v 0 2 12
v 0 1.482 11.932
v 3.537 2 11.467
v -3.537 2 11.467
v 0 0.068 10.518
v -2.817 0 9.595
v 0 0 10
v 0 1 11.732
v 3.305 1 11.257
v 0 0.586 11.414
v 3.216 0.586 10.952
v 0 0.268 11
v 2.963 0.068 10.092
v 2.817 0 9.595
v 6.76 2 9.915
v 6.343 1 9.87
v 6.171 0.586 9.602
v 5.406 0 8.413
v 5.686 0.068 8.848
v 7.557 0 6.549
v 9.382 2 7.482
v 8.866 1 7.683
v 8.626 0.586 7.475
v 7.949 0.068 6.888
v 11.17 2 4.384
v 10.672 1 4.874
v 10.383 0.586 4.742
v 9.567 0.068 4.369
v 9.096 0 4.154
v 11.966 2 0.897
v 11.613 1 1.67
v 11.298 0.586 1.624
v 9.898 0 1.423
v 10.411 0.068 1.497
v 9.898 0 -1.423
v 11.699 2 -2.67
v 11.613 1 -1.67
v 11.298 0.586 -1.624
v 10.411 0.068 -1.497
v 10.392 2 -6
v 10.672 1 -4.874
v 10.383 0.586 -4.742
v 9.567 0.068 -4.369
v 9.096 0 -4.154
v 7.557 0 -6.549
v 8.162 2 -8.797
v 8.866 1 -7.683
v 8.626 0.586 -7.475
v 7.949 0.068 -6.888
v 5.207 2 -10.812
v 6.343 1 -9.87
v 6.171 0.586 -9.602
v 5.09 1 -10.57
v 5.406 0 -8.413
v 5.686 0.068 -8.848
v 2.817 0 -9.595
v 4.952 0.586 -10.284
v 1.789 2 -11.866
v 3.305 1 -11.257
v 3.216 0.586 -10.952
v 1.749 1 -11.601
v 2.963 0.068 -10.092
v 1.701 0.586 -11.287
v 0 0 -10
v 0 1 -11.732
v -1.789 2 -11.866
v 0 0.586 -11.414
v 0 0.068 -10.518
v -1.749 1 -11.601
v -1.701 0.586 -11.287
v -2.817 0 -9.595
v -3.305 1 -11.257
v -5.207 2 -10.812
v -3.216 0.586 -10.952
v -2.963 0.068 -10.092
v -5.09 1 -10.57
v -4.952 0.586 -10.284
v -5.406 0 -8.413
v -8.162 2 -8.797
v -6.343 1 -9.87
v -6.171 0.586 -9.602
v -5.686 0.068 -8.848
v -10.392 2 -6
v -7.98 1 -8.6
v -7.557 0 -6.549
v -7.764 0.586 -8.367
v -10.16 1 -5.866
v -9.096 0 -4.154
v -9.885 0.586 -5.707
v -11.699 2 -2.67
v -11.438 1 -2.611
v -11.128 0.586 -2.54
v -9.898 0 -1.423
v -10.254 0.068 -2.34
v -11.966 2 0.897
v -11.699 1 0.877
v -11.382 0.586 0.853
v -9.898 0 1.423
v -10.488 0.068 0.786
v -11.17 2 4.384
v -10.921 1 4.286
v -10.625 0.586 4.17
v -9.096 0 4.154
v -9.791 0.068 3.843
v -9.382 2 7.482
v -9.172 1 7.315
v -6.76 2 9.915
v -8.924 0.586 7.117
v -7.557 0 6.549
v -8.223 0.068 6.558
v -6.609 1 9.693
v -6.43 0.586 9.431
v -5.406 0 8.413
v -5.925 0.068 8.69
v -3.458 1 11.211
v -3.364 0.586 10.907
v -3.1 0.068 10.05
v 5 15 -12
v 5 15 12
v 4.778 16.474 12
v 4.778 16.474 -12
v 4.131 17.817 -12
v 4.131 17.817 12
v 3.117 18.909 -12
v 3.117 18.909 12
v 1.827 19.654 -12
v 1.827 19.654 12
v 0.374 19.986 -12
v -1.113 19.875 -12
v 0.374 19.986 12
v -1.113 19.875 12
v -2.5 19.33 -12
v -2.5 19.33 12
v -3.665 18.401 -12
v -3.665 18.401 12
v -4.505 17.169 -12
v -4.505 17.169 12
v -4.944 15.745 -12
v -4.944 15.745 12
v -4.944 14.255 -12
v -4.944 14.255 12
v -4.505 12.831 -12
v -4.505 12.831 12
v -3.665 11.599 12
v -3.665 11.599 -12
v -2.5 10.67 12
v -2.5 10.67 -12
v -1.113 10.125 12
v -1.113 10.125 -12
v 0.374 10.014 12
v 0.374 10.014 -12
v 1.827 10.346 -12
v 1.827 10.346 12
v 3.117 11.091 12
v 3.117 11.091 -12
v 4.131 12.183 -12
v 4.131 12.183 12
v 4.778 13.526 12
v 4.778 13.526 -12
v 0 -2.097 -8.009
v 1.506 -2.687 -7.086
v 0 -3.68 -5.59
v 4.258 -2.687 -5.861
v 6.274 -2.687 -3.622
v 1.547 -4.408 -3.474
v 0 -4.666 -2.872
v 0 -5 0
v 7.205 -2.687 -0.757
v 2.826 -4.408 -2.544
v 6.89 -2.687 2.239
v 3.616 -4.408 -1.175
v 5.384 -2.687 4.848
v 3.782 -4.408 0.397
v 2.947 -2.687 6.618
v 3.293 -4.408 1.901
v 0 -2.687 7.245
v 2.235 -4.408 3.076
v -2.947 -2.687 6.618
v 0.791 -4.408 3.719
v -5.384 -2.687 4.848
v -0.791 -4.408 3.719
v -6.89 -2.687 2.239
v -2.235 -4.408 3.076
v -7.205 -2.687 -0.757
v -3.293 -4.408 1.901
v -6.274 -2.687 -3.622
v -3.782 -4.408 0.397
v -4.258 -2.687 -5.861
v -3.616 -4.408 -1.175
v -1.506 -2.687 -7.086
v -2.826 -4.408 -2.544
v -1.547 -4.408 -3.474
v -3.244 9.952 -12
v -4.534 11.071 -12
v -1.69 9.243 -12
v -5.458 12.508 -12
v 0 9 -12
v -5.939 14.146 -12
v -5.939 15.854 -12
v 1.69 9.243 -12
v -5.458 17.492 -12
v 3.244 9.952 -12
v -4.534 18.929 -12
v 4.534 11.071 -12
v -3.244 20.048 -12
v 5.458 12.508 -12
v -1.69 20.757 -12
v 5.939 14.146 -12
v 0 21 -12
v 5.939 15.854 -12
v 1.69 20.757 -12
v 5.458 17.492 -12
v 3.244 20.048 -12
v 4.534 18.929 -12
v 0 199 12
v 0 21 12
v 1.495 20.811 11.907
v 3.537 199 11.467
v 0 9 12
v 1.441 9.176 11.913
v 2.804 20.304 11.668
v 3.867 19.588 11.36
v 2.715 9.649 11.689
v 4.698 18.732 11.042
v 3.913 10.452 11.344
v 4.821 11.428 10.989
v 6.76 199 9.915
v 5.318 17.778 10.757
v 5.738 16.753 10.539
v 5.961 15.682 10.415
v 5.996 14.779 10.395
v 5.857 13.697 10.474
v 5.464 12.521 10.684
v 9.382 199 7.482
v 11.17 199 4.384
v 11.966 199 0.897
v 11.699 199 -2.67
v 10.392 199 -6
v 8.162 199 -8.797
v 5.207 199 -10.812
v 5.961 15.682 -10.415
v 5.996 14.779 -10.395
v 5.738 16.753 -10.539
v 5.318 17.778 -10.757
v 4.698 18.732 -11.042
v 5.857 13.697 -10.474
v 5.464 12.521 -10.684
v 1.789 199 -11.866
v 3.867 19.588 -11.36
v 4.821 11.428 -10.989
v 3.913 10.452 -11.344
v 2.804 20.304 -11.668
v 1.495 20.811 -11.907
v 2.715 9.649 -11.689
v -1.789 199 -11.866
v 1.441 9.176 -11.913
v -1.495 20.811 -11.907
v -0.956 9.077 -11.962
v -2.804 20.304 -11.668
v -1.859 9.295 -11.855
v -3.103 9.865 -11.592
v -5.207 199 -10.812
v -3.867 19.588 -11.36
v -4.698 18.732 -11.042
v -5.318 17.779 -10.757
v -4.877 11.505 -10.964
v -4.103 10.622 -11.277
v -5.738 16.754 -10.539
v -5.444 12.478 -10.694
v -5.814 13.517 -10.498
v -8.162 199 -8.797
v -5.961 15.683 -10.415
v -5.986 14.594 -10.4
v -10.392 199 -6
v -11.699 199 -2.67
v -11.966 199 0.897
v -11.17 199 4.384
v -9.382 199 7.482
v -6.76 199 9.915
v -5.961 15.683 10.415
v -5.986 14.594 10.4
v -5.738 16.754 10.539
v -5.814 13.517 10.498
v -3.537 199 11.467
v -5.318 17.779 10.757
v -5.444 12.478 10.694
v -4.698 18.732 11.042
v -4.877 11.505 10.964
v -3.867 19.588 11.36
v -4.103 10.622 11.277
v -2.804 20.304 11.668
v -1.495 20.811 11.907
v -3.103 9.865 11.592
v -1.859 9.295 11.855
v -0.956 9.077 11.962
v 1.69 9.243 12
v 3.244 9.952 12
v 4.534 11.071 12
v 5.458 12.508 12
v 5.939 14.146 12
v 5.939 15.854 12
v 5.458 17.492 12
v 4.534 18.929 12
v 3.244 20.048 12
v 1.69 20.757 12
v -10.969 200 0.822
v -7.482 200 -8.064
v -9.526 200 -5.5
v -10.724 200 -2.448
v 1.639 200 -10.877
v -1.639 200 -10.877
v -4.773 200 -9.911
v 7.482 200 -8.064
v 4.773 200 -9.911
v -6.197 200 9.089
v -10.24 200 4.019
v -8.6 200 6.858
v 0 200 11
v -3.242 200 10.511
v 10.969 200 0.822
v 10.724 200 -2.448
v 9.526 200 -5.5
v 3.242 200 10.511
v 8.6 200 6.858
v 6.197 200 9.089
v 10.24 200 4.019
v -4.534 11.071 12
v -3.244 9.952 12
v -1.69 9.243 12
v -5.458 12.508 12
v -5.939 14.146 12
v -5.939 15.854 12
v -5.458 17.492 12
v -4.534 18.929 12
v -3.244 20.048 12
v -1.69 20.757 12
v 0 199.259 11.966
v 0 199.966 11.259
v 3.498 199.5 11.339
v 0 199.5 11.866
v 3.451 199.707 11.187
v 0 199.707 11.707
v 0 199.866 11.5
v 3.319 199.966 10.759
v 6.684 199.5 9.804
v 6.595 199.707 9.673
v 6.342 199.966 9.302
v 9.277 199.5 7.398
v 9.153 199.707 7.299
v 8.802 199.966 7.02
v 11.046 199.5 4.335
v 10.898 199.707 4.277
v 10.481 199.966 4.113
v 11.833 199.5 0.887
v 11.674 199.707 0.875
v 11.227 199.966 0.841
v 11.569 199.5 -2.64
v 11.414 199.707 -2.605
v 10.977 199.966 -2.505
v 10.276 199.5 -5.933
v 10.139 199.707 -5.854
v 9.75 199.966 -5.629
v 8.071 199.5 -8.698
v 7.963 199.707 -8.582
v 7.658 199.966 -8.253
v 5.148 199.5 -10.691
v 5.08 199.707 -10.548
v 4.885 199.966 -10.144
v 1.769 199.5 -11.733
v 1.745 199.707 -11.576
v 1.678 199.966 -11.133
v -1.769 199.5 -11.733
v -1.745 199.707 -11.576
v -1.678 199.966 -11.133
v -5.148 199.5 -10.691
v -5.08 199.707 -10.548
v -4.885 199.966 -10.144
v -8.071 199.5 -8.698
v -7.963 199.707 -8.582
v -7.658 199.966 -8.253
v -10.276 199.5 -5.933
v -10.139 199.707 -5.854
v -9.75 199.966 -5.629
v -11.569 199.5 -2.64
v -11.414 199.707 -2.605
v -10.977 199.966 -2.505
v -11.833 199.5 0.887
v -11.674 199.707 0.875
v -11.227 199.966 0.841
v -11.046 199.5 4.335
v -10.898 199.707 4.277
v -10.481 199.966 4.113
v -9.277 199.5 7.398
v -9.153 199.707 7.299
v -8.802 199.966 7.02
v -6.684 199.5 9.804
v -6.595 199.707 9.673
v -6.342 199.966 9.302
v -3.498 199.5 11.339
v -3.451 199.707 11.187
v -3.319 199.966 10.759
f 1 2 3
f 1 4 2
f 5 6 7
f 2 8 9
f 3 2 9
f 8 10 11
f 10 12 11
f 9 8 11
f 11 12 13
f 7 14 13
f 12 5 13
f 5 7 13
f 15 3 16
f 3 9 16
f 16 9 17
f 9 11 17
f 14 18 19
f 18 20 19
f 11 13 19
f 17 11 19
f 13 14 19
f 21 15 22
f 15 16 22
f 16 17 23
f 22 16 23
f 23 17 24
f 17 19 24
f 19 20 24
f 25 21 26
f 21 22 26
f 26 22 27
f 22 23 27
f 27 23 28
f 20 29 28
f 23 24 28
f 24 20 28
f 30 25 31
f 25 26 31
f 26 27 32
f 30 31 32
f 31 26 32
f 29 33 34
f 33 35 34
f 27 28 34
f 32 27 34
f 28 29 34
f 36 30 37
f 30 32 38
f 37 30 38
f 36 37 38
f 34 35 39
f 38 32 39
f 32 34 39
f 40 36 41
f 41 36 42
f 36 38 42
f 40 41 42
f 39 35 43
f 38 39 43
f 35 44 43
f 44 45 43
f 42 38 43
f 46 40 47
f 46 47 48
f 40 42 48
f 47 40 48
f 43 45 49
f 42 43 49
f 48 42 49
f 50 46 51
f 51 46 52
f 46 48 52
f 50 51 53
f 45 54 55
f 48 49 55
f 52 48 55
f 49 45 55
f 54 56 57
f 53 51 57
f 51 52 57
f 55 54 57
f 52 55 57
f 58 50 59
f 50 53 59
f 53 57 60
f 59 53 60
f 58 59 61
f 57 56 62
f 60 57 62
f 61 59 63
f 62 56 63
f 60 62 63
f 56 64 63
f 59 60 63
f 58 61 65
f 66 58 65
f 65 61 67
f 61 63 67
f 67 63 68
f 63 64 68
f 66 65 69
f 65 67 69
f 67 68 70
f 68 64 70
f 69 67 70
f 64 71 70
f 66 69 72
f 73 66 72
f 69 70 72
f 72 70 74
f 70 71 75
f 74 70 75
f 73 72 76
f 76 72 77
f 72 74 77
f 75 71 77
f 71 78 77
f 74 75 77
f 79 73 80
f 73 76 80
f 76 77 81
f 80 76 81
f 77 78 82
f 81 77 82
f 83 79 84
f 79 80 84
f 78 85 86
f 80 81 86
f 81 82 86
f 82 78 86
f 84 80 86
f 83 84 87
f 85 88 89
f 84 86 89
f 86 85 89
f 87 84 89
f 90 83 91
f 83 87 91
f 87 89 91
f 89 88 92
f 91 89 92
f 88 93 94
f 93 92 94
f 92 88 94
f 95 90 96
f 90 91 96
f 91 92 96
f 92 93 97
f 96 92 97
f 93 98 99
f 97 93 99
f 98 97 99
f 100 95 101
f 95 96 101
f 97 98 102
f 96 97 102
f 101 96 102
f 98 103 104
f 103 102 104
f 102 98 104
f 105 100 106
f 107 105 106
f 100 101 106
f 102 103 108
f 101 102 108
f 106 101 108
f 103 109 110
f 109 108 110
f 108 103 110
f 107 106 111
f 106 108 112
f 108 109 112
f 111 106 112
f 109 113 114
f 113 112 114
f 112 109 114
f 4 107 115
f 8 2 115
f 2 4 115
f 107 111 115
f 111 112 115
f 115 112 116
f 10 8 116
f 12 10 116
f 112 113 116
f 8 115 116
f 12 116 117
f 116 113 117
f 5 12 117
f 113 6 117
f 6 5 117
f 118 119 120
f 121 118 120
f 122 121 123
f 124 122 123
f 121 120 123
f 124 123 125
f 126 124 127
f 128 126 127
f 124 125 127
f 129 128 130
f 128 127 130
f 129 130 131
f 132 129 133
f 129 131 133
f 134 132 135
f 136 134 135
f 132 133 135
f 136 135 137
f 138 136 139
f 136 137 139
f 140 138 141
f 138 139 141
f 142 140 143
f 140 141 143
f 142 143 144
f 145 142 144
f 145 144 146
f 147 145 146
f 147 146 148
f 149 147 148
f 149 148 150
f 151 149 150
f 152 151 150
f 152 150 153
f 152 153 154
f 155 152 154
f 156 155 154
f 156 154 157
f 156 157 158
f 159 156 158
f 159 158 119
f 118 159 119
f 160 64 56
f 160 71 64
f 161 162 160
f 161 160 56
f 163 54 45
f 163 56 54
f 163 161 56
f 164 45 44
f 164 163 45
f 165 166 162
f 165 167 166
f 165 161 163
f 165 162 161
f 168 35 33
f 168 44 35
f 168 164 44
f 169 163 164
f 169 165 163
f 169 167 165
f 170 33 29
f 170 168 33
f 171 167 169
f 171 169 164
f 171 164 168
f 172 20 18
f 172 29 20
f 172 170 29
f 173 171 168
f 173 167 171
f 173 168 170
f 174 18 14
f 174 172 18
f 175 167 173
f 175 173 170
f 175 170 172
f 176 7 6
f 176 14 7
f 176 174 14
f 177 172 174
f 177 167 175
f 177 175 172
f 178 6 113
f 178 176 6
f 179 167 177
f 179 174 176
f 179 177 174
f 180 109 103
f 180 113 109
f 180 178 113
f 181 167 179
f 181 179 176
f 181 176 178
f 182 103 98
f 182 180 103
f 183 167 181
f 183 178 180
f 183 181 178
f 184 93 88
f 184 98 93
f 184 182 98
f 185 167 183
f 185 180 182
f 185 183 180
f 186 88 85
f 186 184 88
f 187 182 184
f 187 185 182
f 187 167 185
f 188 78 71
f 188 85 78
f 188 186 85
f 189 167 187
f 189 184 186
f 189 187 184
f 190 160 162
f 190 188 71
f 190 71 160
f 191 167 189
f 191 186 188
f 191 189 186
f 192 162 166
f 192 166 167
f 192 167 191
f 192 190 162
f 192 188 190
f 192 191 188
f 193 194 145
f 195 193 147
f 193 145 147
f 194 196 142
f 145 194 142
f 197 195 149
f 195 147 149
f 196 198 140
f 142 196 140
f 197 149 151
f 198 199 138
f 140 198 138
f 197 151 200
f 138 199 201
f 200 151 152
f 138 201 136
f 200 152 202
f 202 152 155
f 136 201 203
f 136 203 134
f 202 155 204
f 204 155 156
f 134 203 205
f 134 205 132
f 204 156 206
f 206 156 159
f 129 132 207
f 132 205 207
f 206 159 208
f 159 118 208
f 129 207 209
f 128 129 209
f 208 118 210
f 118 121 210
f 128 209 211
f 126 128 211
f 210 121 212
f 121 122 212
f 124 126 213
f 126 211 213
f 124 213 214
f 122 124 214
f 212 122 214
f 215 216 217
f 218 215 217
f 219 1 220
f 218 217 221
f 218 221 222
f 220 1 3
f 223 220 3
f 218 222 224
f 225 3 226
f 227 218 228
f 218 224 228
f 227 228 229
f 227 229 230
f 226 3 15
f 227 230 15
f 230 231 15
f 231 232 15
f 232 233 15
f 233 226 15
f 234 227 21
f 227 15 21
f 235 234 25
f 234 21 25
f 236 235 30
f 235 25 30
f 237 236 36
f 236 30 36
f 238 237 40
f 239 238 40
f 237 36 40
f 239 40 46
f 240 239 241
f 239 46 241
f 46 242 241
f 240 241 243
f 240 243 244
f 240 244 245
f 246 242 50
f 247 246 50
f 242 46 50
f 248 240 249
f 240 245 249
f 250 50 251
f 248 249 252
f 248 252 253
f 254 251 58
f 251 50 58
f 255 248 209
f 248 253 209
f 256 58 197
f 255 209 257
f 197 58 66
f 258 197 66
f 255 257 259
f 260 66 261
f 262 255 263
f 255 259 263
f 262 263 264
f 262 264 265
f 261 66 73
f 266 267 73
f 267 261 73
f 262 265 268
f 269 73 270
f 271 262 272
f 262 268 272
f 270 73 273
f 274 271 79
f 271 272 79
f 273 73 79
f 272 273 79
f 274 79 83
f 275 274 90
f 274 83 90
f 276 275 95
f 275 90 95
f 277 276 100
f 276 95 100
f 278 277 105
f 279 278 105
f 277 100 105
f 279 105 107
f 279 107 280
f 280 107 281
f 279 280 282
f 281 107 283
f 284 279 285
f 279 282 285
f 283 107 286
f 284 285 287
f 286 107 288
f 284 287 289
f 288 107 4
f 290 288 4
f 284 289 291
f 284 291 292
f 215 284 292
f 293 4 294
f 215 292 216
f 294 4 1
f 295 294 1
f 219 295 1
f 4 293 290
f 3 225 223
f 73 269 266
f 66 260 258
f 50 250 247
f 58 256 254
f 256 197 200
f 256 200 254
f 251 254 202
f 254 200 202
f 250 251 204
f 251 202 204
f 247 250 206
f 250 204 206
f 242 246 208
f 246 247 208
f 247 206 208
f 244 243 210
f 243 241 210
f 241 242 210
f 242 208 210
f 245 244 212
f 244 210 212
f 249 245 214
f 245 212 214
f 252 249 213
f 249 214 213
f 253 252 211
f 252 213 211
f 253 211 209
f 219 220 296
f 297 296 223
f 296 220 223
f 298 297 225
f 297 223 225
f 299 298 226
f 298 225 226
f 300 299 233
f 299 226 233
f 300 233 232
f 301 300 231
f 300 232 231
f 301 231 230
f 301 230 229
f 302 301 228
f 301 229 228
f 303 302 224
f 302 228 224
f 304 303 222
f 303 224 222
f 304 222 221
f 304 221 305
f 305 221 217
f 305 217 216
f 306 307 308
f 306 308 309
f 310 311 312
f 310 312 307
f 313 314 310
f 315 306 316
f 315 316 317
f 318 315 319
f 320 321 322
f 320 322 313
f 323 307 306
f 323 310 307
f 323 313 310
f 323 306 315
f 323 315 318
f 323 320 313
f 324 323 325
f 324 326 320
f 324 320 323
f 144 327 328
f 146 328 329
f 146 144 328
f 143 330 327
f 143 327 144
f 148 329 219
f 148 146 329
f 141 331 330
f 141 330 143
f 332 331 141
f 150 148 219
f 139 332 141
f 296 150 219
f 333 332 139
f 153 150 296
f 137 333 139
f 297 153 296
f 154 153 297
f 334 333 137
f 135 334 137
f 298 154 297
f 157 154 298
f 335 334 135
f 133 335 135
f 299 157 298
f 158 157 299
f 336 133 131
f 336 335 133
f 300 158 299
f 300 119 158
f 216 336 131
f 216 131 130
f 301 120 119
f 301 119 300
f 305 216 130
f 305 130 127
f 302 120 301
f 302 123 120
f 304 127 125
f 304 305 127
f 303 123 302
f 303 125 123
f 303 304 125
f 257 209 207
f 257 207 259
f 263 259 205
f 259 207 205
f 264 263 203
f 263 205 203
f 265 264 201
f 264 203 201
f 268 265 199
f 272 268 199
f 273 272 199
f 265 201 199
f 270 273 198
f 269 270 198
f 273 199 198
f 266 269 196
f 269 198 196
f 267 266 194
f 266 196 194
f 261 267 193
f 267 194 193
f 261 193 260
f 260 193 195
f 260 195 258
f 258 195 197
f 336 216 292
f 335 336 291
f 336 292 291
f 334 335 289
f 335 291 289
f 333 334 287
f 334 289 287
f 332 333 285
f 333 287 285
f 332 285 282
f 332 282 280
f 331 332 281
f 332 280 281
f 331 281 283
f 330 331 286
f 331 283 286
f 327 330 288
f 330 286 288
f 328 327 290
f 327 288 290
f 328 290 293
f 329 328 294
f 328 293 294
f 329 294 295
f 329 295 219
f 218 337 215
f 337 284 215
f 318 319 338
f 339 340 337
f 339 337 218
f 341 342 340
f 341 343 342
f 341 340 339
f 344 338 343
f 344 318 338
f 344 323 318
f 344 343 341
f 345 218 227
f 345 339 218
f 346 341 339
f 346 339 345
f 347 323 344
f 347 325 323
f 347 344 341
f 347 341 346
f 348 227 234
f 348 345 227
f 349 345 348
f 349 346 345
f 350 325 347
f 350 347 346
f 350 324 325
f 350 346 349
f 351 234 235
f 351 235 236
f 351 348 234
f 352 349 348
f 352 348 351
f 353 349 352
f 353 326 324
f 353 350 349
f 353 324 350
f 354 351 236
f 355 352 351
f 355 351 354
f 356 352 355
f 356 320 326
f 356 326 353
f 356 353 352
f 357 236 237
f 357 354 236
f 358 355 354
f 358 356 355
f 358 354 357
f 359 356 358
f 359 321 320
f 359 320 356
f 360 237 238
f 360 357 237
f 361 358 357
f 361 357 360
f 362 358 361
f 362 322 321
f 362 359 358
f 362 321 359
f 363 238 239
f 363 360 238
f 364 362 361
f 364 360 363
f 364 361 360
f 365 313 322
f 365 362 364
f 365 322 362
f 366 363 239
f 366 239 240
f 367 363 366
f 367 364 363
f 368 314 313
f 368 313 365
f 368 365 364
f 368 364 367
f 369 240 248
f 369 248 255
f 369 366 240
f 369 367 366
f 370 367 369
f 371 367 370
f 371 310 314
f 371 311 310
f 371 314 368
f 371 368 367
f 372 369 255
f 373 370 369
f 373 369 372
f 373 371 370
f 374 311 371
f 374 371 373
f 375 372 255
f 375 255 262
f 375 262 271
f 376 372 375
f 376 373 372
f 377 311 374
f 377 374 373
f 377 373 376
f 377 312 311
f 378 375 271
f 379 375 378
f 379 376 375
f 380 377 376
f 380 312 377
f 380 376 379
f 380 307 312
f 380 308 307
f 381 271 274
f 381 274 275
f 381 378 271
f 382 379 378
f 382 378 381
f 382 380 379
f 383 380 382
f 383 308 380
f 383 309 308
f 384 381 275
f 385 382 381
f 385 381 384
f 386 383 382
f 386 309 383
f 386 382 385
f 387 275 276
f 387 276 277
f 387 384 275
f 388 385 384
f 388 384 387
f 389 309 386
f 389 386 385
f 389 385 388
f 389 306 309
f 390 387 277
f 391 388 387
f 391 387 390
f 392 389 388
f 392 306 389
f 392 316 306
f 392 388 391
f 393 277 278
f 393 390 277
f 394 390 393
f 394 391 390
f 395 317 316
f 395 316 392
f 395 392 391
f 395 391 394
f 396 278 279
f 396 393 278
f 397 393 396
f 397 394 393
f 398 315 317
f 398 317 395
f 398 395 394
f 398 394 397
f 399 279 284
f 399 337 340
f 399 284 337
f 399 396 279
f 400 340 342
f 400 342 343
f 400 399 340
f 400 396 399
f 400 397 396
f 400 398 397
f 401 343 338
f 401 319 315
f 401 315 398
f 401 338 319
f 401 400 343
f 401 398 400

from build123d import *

# Parameters (mm, degrees)
SKETCH_1_R          = 12
EXTRUDE_1_DEPTH     = 200
EXTRUDE_START       = -24
SKETCH_2_R          = 6
EXTRUDE_2_DEPTH     = 24
CUT_EXTRUDE_1_REACH = 203.792
SKETCH_3_R          = 5
FILLET_1_R          = 2
FILLET_2_R          = 1
DOME_1_FACE_RADIUS  = 10
DOME_1_HEIGHT       = 5


with BuildPart() as part:
    # 스케치1 → 보스-돌출1 (new body)
    with BuildSketch(Plane(origin=(0, 0, 0), x_dir=(1, 0, 0), z_dir=(0, 1, 0))):
        with Locations(Location((0, 0, 0), (0, 0, 270))):
            Circle(SKETCH_1_R)
    extrude(amount=EXTRUDE_1_DEPTH)

    # 스케치2 → 보스-돌출2 (add)
    with BuildSketch(Plane.XY.offset(12).offset(EXTRUDE_START)):
        with Locations((0, 15)):
            Circle(SKETCH_2_R)
    extrude(amount=EXTRUDE_2_DEPTH)

    # 스케치3 → 컷-돌출1 (cut, up to next)
    with BuildSketch(Plane.XY.offset(12), mode=Mode.PRIVATE) as cut_extrude_1_sk1:
        with Locations((0, 15)):
            Circle(SKETCH_3_R)
    cut_extrude_1_tool1 = extrude(cut_extrude_1_sk1.sketch, amount=-CUT_EXTRUDE_1_REACH, mode=Mode.PRIVATE) & part.part
    add(cut_extrude_1_tool1.solids().sort_by_distance((0, 15, 12))[0], mode=Mode.SUBTRACT)

    # 필렛1
    fillet_1_edges = [part.edges().sort_by_distance(p)[0] for p in [
        (0, 0, -12),
    ]]
    fillet(fillet_1_edges, radius=FILLET_1_R)

    # 필렛2
    fillet_2_edges = [part.edges().sort_by_distance(p)[0] for p in [
        (0, 200, -12),
    ]]
    fillet(fillet_2_edges, radius=FILLET_2_R)

    # 돔1: a dome of height H over a round flat face of radius A is a cap of a sphere of radius (A * A + H * H) / (2 * H)
    dome_1_r = (DOME_1_FACE_RADIUS * DOME_1_FACE_RADIUS + DOME_1_HEIGHT * DOME_1_HEIGHT) / (2 * DOME_1_HEIGHT)
    dome_1_base = Plane((0, 0, 0), z_dir=(0, -1, 0))
    with Locations(dome_1_base.offset(DOME_1_HEIGHT - dome_1_r)):
        dome_1_ball = Sphere(dome_1_r, mode=Mode.PRIVATE)
    add(split(dome_1_ball, bisect_by=dome_1_base, keep=Keep.TOP, mode=Mode.PRIVATE))


solid = part.part
